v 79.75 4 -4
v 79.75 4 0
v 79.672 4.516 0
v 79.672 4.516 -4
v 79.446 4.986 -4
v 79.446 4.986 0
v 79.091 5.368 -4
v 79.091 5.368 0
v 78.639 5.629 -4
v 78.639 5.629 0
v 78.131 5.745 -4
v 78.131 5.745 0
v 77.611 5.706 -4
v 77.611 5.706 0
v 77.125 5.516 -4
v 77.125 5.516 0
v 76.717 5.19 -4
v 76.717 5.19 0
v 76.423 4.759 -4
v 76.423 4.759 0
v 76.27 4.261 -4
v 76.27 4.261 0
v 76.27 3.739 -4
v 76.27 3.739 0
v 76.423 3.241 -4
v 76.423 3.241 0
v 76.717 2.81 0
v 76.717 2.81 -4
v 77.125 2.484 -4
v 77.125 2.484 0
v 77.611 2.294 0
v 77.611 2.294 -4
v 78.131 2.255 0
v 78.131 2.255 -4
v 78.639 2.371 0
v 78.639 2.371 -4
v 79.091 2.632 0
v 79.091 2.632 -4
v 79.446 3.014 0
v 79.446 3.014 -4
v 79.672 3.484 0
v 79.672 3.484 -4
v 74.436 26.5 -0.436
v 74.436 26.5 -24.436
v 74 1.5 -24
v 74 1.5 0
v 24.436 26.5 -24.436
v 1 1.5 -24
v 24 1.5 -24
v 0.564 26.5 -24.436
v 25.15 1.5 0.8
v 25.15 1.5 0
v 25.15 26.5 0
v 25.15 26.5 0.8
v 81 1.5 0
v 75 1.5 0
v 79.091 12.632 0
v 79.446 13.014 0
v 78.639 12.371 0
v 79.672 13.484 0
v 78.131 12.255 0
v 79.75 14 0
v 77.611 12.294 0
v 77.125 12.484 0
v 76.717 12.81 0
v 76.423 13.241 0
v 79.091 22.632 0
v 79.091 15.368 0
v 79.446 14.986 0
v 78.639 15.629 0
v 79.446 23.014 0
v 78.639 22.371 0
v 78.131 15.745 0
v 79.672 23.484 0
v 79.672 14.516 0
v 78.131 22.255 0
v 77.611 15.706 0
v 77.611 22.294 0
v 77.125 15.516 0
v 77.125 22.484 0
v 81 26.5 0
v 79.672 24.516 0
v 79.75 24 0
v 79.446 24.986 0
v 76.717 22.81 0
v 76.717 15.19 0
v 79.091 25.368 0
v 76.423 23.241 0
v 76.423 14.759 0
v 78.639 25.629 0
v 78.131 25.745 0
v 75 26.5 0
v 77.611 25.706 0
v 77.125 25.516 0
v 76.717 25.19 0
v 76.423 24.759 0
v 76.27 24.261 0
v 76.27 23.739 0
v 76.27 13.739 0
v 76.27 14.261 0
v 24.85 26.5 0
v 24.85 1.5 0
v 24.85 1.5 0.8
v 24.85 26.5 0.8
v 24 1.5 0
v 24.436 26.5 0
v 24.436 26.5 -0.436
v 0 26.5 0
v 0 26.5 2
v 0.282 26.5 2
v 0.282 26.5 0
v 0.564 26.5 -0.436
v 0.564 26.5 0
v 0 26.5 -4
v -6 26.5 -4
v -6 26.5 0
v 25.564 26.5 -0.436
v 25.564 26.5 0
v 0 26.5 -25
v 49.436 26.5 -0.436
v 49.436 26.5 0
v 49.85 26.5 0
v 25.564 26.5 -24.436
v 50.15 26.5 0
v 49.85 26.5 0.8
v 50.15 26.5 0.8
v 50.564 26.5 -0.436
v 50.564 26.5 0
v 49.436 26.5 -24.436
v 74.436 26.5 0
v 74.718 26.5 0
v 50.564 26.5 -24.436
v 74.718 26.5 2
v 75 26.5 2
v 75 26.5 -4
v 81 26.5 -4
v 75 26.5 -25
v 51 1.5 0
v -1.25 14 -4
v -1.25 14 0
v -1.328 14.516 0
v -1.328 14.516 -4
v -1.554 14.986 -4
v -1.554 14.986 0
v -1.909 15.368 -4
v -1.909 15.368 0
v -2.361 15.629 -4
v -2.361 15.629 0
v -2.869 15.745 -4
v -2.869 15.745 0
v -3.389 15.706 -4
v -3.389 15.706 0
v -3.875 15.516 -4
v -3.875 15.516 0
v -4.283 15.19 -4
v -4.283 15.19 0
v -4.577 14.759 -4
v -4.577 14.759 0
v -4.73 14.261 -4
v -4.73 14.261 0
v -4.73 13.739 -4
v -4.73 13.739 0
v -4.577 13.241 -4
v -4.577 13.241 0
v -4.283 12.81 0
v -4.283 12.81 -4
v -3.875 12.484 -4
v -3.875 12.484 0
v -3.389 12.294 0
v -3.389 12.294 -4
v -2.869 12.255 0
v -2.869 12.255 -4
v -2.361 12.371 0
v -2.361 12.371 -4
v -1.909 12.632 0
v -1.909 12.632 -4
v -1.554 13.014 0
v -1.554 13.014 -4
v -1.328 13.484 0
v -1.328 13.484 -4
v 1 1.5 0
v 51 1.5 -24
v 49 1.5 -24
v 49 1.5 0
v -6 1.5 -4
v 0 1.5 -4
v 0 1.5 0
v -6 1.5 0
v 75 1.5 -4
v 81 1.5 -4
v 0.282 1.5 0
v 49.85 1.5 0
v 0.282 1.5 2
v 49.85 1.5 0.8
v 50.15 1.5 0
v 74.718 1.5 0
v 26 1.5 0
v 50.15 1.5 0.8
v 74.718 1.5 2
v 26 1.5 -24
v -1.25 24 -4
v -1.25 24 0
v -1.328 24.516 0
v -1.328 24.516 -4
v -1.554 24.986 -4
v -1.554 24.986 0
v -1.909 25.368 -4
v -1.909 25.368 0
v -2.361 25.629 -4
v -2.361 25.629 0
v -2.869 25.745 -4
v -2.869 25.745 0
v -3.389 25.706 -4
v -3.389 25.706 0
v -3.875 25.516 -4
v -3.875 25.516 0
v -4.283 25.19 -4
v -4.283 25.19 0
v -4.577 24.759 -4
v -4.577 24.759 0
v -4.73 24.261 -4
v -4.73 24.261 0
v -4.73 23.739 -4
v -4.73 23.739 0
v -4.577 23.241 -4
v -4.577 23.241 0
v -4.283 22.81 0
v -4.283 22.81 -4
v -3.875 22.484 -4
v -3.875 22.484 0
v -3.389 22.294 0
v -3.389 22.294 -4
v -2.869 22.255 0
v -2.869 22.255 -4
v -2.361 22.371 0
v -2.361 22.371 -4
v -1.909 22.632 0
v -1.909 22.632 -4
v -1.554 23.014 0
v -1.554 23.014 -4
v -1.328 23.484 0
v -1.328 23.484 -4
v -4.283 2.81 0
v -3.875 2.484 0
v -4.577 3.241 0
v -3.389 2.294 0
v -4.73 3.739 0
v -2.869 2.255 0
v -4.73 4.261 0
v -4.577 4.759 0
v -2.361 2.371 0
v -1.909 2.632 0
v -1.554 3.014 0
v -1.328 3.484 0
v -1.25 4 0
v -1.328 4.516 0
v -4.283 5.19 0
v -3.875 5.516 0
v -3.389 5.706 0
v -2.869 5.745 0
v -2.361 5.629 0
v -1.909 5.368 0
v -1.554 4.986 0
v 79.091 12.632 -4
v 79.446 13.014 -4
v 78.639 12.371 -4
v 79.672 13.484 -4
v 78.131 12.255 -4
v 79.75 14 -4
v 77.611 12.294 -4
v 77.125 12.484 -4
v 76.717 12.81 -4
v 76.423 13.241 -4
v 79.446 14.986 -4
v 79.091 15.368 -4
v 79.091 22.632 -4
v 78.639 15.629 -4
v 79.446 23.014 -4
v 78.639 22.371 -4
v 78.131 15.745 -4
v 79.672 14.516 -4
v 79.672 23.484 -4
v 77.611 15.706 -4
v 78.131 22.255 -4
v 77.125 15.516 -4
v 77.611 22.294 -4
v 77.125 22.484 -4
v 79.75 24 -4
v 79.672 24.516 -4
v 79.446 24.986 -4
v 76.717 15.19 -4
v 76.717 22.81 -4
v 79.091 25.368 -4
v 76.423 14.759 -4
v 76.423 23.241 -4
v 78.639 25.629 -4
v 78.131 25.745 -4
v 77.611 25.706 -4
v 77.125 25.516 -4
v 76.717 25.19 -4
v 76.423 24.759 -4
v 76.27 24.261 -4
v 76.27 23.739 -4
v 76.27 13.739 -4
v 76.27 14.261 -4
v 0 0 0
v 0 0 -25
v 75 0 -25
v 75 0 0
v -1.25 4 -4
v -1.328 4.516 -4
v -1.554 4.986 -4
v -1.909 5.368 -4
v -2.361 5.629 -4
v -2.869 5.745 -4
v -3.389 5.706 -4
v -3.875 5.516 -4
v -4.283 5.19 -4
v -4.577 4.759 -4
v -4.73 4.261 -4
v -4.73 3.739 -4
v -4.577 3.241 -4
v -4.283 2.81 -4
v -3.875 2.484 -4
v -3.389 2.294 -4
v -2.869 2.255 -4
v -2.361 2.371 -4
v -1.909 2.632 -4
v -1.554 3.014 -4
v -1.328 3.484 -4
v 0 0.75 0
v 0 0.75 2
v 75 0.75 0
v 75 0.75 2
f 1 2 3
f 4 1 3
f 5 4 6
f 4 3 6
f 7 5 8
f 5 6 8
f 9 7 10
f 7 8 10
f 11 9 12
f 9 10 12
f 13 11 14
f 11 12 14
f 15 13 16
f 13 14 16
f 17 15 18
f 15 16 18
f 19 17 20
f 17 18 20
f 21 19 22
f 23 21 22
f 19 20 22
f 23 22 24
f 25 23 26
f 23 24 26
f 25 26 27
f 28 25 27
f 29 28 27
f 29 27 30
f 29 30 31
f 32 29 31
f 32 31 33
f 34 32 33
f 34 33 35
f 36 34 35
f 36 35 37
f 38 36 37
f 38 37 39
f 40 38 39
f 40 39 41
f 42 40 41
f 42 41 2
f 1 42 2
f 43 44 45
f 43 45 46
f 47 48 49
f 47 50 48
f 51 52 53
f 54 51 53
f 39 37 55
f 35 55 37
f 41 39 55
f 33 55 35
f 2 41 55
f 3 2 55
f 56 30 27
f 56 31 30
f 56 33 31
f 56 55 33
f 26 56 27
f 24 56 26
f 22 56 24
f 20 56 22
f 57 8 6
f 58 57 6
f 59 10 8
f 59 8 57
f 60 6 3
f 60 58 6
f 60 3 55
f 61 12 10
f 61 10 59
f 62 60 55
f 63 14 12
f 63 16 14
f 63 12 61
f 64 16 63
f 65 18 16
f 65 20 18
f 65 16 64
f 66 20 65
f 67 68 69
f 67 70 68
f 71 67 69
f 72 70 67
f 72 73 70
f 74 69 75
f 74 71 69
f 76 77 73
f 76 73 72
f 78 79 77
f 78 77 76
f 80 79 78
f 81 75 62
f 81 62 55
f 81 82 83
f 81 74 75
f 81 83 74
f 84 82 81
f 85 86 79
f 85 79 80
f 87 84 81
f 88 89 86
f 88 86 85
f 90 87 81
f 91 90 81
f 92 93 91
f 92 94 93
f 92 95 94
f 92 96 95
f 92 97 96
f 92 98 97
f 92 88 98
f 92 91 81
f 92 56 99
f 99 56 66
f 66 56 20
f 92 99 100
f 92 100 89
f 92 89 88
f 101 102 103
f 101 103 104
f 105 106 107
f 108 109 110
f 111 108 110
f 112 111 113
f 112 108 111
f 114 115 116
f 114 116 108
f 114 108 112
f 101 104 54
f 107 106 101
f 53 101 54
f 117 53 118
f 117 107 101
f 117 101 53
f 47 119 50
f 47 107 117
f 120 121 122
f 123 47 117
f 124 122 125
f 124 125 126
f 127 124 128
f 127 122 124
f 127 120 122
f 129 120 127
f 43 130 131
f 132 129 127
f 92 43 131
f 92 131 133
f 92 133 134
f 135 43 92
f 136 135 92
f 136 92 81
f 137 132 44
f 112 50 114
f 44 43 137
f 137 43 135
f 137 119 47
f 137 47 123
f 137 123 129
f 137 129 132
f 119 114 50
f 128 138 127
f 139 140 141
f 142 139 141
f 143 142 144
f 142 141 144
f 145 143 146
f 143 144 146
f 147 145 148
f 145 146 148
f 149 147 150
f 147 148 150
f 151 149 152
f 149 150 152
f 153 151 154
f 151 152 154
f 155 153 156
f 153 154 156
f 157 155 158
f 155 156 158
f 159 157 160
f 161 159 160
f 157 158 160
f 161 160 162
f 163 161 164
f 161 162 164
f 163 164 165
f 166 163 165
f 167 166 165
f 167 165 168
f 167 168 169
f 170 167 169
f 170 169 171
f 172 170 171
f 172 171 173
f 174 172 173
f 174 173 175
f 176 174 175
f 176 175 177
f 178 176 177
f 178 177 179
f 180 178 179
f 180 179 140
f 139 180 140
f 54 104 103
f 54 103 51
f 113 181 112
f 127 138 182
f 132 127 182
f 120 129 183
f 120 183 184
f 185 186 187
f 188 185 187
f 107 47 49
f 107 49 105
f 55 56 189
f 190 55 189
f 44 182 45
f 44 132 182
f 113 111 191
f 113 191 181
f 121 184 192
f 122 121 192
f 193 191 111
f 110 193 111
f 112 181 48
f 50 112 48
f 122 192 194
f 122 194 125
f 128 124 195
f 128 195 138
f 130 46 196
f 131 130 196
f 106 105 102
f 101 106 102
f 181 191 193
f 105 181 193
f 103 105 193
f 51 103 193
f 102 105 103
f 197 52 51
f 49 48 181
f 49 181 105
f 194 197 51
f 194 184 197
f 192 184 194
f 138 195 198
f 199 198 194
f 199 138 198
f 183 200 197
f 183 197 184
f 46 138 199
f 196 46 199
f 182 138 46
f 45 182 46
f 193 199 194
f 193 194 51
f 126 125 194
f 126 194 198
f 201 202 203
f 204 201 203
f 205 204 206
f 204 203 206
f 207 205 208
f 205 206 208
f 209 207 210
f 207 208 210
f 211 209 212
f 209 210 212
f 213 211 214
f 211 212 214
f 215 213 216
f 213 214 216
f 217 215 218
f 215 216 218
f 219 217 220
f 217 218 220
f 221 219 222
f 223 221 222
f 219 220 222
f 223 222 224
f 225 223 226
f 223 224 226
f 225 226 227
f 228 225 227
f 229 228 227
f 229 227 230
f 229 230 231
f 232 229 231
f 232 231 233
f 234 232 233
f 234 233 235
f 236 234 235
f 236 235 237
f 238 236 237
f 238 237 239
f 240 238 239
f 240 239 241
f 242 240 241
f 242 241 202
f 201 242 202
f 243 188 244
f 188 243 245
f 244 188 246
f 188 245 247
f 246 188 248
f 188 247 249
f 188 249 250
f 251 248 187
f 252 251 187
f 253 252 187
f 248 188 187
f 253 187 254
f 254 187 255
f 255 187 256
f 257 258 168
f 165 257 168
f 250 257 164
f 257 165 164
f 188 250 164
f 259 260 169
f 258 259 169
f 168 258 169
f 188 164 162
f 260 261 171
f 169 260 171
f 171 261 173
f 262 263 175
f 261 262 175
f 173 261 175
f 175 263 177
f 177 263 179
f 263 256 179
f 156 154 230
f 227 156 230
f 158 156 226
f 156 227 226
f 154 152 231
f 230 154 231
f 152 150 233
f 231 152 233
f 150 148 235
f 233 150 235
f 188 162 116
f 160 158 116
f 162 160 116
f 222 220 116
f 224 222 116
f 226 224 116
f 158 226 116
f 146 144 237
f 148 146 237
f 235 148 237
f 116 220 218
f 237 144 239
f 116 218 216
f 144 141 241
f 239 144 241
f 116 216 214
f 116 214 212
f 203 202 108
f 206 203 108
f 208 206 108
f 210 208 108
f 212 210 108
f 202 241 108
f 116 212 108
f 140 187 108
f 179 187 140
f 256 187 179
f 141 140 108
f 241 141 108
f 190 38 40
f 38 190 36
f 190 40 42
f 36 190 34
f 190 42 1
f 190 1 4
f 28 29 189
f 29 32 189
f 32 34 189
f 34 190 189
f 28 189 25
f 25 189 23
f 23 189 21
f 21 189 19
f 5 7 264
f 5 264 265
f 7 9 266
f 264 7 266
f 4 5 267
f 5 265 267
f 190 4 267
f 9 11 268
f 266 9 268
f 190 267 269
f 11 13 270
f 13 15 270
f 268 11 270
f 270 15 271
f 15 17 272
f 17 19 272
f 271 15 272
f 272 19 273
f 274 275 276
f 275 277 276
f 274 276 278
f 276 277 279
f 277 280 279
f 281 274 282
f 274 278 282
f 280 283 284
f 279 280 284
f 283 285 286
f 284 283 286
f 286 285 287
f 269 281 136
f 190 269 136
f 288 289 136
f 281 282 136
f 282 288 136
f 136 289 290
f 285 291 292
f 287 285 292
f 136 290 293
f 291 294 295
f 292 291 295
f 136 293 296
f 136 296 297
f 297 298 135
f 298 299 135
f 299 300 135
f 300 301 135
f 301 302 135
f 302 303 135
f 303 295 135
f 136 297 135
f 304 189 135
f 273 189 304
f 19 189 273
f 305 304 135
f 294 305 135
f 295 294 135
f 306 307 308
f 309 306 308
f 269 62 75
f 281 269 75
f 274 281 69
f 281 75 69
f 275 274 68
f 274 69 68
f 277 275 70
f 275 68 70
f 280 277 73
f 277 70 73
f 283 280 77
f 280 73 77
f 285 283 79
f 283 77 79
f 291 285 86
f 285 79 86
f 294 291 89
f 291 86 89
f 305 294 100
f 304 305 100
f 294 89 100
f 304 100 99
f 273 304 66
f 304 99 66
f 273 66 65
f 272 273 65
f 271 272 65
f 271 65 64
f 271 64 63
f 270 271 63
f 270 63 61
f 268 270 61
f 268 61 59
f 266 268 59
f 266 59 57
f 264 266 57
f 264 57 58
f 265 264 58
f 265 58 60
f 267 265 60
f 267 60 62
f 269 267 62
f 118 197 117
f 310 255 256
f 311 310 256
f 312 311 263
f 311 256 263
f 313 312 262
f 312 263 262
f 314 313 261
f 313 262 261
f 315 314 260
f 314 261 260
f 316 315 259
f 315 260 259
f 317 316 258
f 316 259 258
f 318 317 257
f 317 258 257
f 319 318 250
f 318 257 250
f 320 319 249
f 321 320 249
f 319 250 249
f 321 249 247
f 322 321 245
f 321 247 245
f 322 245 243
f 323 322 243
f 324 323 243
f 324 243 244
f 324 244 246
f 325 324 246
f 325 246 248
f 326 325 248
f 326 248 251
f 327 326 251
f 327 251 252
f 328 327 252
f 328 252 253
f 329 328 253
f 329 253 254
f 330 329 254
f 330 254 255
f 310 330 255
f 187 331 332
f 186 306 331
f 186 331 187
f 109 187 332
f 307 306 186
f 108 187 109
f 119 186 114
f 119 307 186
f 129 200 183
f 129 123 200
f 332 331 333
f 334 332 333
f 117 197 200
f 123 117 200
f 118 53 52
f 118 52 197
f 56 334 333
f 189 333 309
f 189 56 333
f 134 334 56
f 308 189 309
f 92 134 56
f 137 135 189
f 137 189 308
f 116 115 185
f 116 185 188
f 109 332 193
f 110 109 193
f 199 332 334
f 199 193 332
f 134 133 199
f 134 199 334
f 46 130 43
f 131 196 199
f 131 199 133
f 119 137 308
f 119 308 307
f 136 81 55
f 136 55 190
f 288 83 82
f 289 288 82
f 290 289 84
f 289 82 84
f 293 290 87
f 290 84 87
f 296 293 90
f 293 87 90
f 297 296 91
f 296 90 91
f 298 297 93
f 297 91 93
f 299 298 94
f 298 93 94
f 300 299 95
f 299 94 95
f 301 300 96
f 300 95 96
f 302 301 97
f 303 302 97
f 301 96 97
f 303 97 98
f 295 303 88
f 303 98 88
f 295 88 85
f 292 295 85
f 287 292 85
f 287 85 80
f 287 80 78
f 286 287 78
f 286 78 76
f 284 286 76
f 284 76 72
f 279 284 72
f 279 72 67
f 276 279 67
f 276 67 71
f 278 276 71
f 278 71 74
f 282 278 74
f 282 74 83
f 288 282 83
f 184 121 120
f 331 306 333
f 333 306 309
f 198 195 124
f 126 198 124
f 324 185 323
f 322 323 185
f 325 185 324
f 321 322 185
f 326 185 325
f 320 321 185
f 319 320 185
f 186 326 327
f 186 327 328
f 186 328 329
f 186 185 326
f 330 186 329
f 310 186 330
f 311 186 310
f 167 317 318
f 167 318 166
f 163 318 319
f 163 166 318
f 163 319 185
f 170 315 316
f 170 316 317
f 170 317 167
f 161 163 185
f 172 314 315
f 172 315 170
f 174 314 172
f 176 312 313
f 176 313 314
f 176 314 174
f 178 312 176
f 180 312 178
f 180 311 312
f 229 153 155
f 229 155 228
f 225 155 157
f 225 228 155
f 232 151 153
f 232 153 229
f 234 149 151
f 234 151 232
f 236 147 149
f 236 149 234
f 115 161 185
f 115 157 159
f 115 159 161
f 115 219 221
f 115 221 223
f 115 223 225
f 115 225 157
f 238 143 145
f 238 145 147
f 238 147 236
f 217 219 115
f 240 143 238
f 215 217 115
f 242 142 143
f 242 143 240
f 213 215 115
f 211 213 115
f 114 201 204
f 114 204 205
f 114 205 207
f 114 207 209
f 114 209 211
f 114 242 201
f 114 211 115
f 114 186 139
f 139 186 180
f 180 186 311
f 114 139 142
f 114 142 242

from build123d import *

# Parameters (mm, degrees)
SKETCH2_W            = 75
SKETCH2_H            = 25
BOSS_EXTRUDE1_DEPTH  = 1.5
BOSS_EXTRUDE5_DEPTH  = 25
BOSS_EXTRUDE5_TAPER  = 1
SKETCH6_W            = 75
SKETCH6_H            = 0.75
BOSS_EXTRUDE6_DEPTH  = 2
BOSS_EXTRUDE7_REACH  = 85.38
BOSS_EXTRUDE8_DEPTH  = 0.436377
SKETCH10_W           = 0.281811688
SKETCH10_H           = 25
BOSS_EXTRUDE9_DEPTH  = 2
SKETCH13_W           = 4
SKETCH13_H           = 25
BOSS_EXTRUDE10_DEPTH = 6
SKETCH14_W           = 4
SKETCH14_H           = 25
BOSS_EXTRUDE11_DEPTH = 6
SKETCH15_R           = 1.75
CUT_EXTRUDE1_DEPTH   = 6
SKETCH16_W           = 0.3
SKETCH16_H           = 25
BOSS_EXTRUDE12_DEPTH = 0.8


with BuildPart() as part:
    # Sketch2 → Boss-Extrude1 (new body)
    with BuildSketch(Plane(origin=(0, 0, 0), x_dir=(1, 0, 0), z_dir=(0, 1, 0))):
        with Locations((37.5, 12.5)):
            Rectangle(SKETCH2_W, SKETCH2_H)
    extrude(amount=BOSS_EXTRUDE1_DEPTH)

    # Sketch4 → Boss-Extrude5 (add)
    with BuildSketch(Plane(origin=(0, 1.5, 0), x_dir=(1, 0, 0), z_dir=(0, 1, 0))):
        Polygon((24, 25), (0, 25), (0, 0), (1, 0), (1, 24), (24, 24), (24, 0), (26, 0), (26, 24), (49, 24), (49, 0), (51, 0), (51, 24), (74, 24), (74, 0), (75, 0), (75, 25), (51, 25), (49, 25), (26, 25), align=None)
    extrude(amount=BOSS_EXTRUDE5_DEPTH, taper=BOSS_EXTRUDE5_TAPER)

    # Sketch6 → Boss-Extrude6 (add)
    with BuildSketch(Plane.XY):
        with Locations((37.5, 1.125)):
            Rectangle(SKETCH6_W, SKETCH6_H)
    extrude(amount=BOSS_EXTRUDE6_DEPTH)

    # Boss-Extrude7: up to this face of the body (flat: up to its plane)
    boss_extrude7_end = Plane(part.part.faces().sort_by_distance((37.5, 1.5, -10.920265781))[0])
    # Sketch8 → Boss-Extrude7 (add, up to the picked face)
    with BuildSketch(Plane(origin=(0, 26.5, 0), x_dir=(1, 0, 0), z_dir=(0, 1, 0)), mode=Mode.PRIVATE) as boss_extrude7_sk1:
        Polygon((0, 25), (0, 0), (0.436376623, 0.436376623), (0.436376623, 24.563623377), (74.563623377, 24.563623377), (74.563623377, 0.436376623), (75, 0), (75, 25), align=None)
    boss_extrude7_tool1 = split(extrude(boss_extrude7_sk1.sketch, amount=-BOSS_EXTRUDE7_REACH, mode=Mode.PRIVATE), bisect_by=boss_extrude7_end, keep=Keep.BOTH, mode=Mode.PRIVATE)
    add(boss_extrude7_tool1.solids().sort_by(Axis((0.079057, 26.5, -12.5), (0, -1, 0)))[0])

    # Sketch9 → Boss-Extrude8 (add)
    with BuildSketch(Plane(origin=(0, 0, 0), x_dir=(-1, 0, 0), z_dir=(0, 0, -1))):
        Polygon((-75, 1.5), (-75, 26.5), (-74.563623377, 26.5), (-74.436376623, 26.5), (-74, 1.5), align=None)
        Polygon((-49, 1.5), (-51, 1.5), (-50.563623377, 26.5), (-49.436376623, 26.5), align=None)
        Polygon((-0.436376623, 26.5), (0, 26.5), (0, 1.5), (-1, 1.5), (-0.563623377, 26.5), align=None)
        Polygon((-24, 1.5), (-26, 1.5), (-25.563623377, 26.5), (-24.436376623, 26.5), align=None)
    extrude(amount=BOSS_EXTRUDE8_DEPTH)

    # Sketch10 → Boss-Extrude9 (add)
    with BuildSketch(Plane.XY):
        with Locations((0.140905844, 14)):
            Rectangle(SKETCH10_W, SKETCH10_H)
        with Locations((74.859094156, 14)):
            Rectangle(SKETCH10_W, SKETCH10_H)
    extrude(amount=BOSS_EXTRUDE9_DEPTH)

    # Sketch13 → Boss-Extrude10 (add)
    with BuildSketch(Plane.ZY):
        with Locations((-2, 14)):
            Rectangle(SKETCH13_W, SKETCH13_H)
    extrude(amount=BOSS_EXTRUDE10_DEPTH)

    # Sketch14 → Boss-Extrude11 (add)
    with BuildSketch(Plane(origin=(75, 0, 0), x_dir=(0, 0, -1), z_dir=(1, 0, 0))):
        with Locations((2, 14)):
            Rectangle(SKETCH14_W, SKETCH14_H)
    extrude(amount=BOSS_EXTRUDE11_DEPTH)

    # Sketch15 → Cut-Extrude1 (cut)
    with BuildSketch(Plane.XY):
        with Locations((-3, 24)):
            Circle(SKETCH15_R)
        with Locations((78, 24)):
            Circle(SKETCH15_R)
        with Locations((-3, 14)):
            Circle(SKETCH15_R)
        with Locations((-3, 4)):
            Circle(SKETCH15_R)
        with Locations((78, 14)):
            Circle(SKETCH15_R)
        with Locations((78, 4)):
            Circle(SKETCH15_R)
    extrude(amount=-CUT_EXTRUDE1_DEPTH, mode=Mode.SUBTRACT)

    # Sketch16 → Boss-Extrude12 (add)
    with BuildSketch(Plane.XY):
        with Locations((25, 14)):
            Rectangle(SKETCH16_W, SKETCH16_H)
        with Locations((50, 14)):
            Rectangle(SKETCH16_W, SKETCH16_H)
    extrude(amount=BOSS_EXTRUDE12_DEPTH)


solid = part.part
